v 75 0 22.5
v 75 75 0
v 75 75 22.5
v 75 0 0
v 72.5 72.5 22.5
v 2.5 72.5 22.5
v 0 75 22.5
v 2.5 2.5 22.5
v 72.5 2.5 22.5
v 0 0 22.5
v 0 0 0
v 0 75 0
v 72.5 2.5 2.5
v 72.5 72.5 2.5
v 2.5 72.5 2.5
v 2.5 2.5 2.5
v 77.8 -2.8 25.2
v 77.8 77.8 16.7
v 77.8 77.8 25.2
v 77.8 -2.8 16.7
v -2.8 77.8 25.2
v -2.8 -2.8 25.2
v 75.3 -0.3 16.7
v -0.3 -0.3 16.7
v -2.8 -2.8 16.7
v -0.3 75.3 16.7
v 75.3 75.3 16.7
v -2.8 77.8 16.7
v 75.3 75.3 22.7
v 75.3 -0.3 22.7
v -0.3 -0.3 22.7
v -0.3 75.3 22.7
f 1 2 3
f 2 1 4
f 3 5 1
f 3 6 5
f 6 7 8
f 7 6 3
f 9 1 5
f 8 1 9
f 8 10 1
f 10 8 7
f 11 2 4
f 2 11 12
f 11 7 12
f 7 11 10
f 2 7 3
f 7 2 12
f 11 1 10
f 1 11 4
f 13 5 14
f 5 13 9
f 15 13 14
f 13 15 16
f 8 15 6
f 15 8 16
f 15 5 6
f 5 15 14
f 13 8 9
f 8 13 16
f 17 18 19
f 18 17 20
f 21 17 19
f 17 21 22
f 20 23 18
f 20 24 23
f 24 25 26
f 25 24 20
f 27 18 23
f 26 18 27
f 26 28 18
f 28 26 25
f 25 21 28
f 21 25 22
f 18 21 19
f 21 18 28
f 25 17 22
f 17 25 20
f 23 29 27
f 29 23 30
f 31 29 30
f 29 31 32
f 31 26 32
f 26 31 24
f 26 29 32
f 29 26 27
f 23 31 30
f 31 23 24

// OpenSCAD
$fn = 48;

// Units: mm
// Two-part enclosure with >= 70 x 70 x 20 internal cavity,
// 2.5 mm nominal wall thickness, and modeled print clearance.

inner_x = 70;
inner_y = 70;
inner_z = 20;

wall_t = 2.5;
floor_t = 2.5;
lid_top_t = 2.5;

radial_clearance = 0.30;   // side clearance between lid pocket and base exterior
vertical_clearance = 0.20; // clearance between base top edge and lid roof
skirt_depth = 6.0;

eps = 0.01;

base_outer_x = inner_x + 2 * wall_t;
base_outer_y = inner_y + 2 * wall_t;
base_outer_z = inner_z + floor_t;

lid_pocket_x = base_outer_x + 2 * radial_clearance;
lid_pocket_y = base_outer_y + 2 * radial_clearance;
lid_outer_x  = lid_pocket_x + 2 * wall_t;
lid_outer_y  = lid_pocket_y + 2 * wall_t;
lid_outer_z  = skirt_depth + lid_top_t;

// Lid is centered over the base in its nominal assembled position,
// with explicit side and vertical clearances so the solids do not interfere.
lid_pos = [
    -(wall_t + radial_clearance),
    -(wall_t + radial_clearance),
    base_outer_z - skirt_depth + vertical_clearance
];

module base_part() {
    difference() {
        cube([base_outer_x, base_outer_y, base_outer_z], center = false);
        translate([wall_t, wall_t, floor_t])
            cube([inner_x, inner_y, inner_z + eps], center = false);
    }
}

module lid_part() {
    difference() {
        cube([lid_outer_x, lid_outer_y, lid_outer_z], center = false);
        translate([wall_t, wall_t, -eps])
            cube([lid_pocket_x, lid_pocket_y, skirt_depth + eps], center = false);
    }
}

base_part();
translate(lid_pos) lid_part();
